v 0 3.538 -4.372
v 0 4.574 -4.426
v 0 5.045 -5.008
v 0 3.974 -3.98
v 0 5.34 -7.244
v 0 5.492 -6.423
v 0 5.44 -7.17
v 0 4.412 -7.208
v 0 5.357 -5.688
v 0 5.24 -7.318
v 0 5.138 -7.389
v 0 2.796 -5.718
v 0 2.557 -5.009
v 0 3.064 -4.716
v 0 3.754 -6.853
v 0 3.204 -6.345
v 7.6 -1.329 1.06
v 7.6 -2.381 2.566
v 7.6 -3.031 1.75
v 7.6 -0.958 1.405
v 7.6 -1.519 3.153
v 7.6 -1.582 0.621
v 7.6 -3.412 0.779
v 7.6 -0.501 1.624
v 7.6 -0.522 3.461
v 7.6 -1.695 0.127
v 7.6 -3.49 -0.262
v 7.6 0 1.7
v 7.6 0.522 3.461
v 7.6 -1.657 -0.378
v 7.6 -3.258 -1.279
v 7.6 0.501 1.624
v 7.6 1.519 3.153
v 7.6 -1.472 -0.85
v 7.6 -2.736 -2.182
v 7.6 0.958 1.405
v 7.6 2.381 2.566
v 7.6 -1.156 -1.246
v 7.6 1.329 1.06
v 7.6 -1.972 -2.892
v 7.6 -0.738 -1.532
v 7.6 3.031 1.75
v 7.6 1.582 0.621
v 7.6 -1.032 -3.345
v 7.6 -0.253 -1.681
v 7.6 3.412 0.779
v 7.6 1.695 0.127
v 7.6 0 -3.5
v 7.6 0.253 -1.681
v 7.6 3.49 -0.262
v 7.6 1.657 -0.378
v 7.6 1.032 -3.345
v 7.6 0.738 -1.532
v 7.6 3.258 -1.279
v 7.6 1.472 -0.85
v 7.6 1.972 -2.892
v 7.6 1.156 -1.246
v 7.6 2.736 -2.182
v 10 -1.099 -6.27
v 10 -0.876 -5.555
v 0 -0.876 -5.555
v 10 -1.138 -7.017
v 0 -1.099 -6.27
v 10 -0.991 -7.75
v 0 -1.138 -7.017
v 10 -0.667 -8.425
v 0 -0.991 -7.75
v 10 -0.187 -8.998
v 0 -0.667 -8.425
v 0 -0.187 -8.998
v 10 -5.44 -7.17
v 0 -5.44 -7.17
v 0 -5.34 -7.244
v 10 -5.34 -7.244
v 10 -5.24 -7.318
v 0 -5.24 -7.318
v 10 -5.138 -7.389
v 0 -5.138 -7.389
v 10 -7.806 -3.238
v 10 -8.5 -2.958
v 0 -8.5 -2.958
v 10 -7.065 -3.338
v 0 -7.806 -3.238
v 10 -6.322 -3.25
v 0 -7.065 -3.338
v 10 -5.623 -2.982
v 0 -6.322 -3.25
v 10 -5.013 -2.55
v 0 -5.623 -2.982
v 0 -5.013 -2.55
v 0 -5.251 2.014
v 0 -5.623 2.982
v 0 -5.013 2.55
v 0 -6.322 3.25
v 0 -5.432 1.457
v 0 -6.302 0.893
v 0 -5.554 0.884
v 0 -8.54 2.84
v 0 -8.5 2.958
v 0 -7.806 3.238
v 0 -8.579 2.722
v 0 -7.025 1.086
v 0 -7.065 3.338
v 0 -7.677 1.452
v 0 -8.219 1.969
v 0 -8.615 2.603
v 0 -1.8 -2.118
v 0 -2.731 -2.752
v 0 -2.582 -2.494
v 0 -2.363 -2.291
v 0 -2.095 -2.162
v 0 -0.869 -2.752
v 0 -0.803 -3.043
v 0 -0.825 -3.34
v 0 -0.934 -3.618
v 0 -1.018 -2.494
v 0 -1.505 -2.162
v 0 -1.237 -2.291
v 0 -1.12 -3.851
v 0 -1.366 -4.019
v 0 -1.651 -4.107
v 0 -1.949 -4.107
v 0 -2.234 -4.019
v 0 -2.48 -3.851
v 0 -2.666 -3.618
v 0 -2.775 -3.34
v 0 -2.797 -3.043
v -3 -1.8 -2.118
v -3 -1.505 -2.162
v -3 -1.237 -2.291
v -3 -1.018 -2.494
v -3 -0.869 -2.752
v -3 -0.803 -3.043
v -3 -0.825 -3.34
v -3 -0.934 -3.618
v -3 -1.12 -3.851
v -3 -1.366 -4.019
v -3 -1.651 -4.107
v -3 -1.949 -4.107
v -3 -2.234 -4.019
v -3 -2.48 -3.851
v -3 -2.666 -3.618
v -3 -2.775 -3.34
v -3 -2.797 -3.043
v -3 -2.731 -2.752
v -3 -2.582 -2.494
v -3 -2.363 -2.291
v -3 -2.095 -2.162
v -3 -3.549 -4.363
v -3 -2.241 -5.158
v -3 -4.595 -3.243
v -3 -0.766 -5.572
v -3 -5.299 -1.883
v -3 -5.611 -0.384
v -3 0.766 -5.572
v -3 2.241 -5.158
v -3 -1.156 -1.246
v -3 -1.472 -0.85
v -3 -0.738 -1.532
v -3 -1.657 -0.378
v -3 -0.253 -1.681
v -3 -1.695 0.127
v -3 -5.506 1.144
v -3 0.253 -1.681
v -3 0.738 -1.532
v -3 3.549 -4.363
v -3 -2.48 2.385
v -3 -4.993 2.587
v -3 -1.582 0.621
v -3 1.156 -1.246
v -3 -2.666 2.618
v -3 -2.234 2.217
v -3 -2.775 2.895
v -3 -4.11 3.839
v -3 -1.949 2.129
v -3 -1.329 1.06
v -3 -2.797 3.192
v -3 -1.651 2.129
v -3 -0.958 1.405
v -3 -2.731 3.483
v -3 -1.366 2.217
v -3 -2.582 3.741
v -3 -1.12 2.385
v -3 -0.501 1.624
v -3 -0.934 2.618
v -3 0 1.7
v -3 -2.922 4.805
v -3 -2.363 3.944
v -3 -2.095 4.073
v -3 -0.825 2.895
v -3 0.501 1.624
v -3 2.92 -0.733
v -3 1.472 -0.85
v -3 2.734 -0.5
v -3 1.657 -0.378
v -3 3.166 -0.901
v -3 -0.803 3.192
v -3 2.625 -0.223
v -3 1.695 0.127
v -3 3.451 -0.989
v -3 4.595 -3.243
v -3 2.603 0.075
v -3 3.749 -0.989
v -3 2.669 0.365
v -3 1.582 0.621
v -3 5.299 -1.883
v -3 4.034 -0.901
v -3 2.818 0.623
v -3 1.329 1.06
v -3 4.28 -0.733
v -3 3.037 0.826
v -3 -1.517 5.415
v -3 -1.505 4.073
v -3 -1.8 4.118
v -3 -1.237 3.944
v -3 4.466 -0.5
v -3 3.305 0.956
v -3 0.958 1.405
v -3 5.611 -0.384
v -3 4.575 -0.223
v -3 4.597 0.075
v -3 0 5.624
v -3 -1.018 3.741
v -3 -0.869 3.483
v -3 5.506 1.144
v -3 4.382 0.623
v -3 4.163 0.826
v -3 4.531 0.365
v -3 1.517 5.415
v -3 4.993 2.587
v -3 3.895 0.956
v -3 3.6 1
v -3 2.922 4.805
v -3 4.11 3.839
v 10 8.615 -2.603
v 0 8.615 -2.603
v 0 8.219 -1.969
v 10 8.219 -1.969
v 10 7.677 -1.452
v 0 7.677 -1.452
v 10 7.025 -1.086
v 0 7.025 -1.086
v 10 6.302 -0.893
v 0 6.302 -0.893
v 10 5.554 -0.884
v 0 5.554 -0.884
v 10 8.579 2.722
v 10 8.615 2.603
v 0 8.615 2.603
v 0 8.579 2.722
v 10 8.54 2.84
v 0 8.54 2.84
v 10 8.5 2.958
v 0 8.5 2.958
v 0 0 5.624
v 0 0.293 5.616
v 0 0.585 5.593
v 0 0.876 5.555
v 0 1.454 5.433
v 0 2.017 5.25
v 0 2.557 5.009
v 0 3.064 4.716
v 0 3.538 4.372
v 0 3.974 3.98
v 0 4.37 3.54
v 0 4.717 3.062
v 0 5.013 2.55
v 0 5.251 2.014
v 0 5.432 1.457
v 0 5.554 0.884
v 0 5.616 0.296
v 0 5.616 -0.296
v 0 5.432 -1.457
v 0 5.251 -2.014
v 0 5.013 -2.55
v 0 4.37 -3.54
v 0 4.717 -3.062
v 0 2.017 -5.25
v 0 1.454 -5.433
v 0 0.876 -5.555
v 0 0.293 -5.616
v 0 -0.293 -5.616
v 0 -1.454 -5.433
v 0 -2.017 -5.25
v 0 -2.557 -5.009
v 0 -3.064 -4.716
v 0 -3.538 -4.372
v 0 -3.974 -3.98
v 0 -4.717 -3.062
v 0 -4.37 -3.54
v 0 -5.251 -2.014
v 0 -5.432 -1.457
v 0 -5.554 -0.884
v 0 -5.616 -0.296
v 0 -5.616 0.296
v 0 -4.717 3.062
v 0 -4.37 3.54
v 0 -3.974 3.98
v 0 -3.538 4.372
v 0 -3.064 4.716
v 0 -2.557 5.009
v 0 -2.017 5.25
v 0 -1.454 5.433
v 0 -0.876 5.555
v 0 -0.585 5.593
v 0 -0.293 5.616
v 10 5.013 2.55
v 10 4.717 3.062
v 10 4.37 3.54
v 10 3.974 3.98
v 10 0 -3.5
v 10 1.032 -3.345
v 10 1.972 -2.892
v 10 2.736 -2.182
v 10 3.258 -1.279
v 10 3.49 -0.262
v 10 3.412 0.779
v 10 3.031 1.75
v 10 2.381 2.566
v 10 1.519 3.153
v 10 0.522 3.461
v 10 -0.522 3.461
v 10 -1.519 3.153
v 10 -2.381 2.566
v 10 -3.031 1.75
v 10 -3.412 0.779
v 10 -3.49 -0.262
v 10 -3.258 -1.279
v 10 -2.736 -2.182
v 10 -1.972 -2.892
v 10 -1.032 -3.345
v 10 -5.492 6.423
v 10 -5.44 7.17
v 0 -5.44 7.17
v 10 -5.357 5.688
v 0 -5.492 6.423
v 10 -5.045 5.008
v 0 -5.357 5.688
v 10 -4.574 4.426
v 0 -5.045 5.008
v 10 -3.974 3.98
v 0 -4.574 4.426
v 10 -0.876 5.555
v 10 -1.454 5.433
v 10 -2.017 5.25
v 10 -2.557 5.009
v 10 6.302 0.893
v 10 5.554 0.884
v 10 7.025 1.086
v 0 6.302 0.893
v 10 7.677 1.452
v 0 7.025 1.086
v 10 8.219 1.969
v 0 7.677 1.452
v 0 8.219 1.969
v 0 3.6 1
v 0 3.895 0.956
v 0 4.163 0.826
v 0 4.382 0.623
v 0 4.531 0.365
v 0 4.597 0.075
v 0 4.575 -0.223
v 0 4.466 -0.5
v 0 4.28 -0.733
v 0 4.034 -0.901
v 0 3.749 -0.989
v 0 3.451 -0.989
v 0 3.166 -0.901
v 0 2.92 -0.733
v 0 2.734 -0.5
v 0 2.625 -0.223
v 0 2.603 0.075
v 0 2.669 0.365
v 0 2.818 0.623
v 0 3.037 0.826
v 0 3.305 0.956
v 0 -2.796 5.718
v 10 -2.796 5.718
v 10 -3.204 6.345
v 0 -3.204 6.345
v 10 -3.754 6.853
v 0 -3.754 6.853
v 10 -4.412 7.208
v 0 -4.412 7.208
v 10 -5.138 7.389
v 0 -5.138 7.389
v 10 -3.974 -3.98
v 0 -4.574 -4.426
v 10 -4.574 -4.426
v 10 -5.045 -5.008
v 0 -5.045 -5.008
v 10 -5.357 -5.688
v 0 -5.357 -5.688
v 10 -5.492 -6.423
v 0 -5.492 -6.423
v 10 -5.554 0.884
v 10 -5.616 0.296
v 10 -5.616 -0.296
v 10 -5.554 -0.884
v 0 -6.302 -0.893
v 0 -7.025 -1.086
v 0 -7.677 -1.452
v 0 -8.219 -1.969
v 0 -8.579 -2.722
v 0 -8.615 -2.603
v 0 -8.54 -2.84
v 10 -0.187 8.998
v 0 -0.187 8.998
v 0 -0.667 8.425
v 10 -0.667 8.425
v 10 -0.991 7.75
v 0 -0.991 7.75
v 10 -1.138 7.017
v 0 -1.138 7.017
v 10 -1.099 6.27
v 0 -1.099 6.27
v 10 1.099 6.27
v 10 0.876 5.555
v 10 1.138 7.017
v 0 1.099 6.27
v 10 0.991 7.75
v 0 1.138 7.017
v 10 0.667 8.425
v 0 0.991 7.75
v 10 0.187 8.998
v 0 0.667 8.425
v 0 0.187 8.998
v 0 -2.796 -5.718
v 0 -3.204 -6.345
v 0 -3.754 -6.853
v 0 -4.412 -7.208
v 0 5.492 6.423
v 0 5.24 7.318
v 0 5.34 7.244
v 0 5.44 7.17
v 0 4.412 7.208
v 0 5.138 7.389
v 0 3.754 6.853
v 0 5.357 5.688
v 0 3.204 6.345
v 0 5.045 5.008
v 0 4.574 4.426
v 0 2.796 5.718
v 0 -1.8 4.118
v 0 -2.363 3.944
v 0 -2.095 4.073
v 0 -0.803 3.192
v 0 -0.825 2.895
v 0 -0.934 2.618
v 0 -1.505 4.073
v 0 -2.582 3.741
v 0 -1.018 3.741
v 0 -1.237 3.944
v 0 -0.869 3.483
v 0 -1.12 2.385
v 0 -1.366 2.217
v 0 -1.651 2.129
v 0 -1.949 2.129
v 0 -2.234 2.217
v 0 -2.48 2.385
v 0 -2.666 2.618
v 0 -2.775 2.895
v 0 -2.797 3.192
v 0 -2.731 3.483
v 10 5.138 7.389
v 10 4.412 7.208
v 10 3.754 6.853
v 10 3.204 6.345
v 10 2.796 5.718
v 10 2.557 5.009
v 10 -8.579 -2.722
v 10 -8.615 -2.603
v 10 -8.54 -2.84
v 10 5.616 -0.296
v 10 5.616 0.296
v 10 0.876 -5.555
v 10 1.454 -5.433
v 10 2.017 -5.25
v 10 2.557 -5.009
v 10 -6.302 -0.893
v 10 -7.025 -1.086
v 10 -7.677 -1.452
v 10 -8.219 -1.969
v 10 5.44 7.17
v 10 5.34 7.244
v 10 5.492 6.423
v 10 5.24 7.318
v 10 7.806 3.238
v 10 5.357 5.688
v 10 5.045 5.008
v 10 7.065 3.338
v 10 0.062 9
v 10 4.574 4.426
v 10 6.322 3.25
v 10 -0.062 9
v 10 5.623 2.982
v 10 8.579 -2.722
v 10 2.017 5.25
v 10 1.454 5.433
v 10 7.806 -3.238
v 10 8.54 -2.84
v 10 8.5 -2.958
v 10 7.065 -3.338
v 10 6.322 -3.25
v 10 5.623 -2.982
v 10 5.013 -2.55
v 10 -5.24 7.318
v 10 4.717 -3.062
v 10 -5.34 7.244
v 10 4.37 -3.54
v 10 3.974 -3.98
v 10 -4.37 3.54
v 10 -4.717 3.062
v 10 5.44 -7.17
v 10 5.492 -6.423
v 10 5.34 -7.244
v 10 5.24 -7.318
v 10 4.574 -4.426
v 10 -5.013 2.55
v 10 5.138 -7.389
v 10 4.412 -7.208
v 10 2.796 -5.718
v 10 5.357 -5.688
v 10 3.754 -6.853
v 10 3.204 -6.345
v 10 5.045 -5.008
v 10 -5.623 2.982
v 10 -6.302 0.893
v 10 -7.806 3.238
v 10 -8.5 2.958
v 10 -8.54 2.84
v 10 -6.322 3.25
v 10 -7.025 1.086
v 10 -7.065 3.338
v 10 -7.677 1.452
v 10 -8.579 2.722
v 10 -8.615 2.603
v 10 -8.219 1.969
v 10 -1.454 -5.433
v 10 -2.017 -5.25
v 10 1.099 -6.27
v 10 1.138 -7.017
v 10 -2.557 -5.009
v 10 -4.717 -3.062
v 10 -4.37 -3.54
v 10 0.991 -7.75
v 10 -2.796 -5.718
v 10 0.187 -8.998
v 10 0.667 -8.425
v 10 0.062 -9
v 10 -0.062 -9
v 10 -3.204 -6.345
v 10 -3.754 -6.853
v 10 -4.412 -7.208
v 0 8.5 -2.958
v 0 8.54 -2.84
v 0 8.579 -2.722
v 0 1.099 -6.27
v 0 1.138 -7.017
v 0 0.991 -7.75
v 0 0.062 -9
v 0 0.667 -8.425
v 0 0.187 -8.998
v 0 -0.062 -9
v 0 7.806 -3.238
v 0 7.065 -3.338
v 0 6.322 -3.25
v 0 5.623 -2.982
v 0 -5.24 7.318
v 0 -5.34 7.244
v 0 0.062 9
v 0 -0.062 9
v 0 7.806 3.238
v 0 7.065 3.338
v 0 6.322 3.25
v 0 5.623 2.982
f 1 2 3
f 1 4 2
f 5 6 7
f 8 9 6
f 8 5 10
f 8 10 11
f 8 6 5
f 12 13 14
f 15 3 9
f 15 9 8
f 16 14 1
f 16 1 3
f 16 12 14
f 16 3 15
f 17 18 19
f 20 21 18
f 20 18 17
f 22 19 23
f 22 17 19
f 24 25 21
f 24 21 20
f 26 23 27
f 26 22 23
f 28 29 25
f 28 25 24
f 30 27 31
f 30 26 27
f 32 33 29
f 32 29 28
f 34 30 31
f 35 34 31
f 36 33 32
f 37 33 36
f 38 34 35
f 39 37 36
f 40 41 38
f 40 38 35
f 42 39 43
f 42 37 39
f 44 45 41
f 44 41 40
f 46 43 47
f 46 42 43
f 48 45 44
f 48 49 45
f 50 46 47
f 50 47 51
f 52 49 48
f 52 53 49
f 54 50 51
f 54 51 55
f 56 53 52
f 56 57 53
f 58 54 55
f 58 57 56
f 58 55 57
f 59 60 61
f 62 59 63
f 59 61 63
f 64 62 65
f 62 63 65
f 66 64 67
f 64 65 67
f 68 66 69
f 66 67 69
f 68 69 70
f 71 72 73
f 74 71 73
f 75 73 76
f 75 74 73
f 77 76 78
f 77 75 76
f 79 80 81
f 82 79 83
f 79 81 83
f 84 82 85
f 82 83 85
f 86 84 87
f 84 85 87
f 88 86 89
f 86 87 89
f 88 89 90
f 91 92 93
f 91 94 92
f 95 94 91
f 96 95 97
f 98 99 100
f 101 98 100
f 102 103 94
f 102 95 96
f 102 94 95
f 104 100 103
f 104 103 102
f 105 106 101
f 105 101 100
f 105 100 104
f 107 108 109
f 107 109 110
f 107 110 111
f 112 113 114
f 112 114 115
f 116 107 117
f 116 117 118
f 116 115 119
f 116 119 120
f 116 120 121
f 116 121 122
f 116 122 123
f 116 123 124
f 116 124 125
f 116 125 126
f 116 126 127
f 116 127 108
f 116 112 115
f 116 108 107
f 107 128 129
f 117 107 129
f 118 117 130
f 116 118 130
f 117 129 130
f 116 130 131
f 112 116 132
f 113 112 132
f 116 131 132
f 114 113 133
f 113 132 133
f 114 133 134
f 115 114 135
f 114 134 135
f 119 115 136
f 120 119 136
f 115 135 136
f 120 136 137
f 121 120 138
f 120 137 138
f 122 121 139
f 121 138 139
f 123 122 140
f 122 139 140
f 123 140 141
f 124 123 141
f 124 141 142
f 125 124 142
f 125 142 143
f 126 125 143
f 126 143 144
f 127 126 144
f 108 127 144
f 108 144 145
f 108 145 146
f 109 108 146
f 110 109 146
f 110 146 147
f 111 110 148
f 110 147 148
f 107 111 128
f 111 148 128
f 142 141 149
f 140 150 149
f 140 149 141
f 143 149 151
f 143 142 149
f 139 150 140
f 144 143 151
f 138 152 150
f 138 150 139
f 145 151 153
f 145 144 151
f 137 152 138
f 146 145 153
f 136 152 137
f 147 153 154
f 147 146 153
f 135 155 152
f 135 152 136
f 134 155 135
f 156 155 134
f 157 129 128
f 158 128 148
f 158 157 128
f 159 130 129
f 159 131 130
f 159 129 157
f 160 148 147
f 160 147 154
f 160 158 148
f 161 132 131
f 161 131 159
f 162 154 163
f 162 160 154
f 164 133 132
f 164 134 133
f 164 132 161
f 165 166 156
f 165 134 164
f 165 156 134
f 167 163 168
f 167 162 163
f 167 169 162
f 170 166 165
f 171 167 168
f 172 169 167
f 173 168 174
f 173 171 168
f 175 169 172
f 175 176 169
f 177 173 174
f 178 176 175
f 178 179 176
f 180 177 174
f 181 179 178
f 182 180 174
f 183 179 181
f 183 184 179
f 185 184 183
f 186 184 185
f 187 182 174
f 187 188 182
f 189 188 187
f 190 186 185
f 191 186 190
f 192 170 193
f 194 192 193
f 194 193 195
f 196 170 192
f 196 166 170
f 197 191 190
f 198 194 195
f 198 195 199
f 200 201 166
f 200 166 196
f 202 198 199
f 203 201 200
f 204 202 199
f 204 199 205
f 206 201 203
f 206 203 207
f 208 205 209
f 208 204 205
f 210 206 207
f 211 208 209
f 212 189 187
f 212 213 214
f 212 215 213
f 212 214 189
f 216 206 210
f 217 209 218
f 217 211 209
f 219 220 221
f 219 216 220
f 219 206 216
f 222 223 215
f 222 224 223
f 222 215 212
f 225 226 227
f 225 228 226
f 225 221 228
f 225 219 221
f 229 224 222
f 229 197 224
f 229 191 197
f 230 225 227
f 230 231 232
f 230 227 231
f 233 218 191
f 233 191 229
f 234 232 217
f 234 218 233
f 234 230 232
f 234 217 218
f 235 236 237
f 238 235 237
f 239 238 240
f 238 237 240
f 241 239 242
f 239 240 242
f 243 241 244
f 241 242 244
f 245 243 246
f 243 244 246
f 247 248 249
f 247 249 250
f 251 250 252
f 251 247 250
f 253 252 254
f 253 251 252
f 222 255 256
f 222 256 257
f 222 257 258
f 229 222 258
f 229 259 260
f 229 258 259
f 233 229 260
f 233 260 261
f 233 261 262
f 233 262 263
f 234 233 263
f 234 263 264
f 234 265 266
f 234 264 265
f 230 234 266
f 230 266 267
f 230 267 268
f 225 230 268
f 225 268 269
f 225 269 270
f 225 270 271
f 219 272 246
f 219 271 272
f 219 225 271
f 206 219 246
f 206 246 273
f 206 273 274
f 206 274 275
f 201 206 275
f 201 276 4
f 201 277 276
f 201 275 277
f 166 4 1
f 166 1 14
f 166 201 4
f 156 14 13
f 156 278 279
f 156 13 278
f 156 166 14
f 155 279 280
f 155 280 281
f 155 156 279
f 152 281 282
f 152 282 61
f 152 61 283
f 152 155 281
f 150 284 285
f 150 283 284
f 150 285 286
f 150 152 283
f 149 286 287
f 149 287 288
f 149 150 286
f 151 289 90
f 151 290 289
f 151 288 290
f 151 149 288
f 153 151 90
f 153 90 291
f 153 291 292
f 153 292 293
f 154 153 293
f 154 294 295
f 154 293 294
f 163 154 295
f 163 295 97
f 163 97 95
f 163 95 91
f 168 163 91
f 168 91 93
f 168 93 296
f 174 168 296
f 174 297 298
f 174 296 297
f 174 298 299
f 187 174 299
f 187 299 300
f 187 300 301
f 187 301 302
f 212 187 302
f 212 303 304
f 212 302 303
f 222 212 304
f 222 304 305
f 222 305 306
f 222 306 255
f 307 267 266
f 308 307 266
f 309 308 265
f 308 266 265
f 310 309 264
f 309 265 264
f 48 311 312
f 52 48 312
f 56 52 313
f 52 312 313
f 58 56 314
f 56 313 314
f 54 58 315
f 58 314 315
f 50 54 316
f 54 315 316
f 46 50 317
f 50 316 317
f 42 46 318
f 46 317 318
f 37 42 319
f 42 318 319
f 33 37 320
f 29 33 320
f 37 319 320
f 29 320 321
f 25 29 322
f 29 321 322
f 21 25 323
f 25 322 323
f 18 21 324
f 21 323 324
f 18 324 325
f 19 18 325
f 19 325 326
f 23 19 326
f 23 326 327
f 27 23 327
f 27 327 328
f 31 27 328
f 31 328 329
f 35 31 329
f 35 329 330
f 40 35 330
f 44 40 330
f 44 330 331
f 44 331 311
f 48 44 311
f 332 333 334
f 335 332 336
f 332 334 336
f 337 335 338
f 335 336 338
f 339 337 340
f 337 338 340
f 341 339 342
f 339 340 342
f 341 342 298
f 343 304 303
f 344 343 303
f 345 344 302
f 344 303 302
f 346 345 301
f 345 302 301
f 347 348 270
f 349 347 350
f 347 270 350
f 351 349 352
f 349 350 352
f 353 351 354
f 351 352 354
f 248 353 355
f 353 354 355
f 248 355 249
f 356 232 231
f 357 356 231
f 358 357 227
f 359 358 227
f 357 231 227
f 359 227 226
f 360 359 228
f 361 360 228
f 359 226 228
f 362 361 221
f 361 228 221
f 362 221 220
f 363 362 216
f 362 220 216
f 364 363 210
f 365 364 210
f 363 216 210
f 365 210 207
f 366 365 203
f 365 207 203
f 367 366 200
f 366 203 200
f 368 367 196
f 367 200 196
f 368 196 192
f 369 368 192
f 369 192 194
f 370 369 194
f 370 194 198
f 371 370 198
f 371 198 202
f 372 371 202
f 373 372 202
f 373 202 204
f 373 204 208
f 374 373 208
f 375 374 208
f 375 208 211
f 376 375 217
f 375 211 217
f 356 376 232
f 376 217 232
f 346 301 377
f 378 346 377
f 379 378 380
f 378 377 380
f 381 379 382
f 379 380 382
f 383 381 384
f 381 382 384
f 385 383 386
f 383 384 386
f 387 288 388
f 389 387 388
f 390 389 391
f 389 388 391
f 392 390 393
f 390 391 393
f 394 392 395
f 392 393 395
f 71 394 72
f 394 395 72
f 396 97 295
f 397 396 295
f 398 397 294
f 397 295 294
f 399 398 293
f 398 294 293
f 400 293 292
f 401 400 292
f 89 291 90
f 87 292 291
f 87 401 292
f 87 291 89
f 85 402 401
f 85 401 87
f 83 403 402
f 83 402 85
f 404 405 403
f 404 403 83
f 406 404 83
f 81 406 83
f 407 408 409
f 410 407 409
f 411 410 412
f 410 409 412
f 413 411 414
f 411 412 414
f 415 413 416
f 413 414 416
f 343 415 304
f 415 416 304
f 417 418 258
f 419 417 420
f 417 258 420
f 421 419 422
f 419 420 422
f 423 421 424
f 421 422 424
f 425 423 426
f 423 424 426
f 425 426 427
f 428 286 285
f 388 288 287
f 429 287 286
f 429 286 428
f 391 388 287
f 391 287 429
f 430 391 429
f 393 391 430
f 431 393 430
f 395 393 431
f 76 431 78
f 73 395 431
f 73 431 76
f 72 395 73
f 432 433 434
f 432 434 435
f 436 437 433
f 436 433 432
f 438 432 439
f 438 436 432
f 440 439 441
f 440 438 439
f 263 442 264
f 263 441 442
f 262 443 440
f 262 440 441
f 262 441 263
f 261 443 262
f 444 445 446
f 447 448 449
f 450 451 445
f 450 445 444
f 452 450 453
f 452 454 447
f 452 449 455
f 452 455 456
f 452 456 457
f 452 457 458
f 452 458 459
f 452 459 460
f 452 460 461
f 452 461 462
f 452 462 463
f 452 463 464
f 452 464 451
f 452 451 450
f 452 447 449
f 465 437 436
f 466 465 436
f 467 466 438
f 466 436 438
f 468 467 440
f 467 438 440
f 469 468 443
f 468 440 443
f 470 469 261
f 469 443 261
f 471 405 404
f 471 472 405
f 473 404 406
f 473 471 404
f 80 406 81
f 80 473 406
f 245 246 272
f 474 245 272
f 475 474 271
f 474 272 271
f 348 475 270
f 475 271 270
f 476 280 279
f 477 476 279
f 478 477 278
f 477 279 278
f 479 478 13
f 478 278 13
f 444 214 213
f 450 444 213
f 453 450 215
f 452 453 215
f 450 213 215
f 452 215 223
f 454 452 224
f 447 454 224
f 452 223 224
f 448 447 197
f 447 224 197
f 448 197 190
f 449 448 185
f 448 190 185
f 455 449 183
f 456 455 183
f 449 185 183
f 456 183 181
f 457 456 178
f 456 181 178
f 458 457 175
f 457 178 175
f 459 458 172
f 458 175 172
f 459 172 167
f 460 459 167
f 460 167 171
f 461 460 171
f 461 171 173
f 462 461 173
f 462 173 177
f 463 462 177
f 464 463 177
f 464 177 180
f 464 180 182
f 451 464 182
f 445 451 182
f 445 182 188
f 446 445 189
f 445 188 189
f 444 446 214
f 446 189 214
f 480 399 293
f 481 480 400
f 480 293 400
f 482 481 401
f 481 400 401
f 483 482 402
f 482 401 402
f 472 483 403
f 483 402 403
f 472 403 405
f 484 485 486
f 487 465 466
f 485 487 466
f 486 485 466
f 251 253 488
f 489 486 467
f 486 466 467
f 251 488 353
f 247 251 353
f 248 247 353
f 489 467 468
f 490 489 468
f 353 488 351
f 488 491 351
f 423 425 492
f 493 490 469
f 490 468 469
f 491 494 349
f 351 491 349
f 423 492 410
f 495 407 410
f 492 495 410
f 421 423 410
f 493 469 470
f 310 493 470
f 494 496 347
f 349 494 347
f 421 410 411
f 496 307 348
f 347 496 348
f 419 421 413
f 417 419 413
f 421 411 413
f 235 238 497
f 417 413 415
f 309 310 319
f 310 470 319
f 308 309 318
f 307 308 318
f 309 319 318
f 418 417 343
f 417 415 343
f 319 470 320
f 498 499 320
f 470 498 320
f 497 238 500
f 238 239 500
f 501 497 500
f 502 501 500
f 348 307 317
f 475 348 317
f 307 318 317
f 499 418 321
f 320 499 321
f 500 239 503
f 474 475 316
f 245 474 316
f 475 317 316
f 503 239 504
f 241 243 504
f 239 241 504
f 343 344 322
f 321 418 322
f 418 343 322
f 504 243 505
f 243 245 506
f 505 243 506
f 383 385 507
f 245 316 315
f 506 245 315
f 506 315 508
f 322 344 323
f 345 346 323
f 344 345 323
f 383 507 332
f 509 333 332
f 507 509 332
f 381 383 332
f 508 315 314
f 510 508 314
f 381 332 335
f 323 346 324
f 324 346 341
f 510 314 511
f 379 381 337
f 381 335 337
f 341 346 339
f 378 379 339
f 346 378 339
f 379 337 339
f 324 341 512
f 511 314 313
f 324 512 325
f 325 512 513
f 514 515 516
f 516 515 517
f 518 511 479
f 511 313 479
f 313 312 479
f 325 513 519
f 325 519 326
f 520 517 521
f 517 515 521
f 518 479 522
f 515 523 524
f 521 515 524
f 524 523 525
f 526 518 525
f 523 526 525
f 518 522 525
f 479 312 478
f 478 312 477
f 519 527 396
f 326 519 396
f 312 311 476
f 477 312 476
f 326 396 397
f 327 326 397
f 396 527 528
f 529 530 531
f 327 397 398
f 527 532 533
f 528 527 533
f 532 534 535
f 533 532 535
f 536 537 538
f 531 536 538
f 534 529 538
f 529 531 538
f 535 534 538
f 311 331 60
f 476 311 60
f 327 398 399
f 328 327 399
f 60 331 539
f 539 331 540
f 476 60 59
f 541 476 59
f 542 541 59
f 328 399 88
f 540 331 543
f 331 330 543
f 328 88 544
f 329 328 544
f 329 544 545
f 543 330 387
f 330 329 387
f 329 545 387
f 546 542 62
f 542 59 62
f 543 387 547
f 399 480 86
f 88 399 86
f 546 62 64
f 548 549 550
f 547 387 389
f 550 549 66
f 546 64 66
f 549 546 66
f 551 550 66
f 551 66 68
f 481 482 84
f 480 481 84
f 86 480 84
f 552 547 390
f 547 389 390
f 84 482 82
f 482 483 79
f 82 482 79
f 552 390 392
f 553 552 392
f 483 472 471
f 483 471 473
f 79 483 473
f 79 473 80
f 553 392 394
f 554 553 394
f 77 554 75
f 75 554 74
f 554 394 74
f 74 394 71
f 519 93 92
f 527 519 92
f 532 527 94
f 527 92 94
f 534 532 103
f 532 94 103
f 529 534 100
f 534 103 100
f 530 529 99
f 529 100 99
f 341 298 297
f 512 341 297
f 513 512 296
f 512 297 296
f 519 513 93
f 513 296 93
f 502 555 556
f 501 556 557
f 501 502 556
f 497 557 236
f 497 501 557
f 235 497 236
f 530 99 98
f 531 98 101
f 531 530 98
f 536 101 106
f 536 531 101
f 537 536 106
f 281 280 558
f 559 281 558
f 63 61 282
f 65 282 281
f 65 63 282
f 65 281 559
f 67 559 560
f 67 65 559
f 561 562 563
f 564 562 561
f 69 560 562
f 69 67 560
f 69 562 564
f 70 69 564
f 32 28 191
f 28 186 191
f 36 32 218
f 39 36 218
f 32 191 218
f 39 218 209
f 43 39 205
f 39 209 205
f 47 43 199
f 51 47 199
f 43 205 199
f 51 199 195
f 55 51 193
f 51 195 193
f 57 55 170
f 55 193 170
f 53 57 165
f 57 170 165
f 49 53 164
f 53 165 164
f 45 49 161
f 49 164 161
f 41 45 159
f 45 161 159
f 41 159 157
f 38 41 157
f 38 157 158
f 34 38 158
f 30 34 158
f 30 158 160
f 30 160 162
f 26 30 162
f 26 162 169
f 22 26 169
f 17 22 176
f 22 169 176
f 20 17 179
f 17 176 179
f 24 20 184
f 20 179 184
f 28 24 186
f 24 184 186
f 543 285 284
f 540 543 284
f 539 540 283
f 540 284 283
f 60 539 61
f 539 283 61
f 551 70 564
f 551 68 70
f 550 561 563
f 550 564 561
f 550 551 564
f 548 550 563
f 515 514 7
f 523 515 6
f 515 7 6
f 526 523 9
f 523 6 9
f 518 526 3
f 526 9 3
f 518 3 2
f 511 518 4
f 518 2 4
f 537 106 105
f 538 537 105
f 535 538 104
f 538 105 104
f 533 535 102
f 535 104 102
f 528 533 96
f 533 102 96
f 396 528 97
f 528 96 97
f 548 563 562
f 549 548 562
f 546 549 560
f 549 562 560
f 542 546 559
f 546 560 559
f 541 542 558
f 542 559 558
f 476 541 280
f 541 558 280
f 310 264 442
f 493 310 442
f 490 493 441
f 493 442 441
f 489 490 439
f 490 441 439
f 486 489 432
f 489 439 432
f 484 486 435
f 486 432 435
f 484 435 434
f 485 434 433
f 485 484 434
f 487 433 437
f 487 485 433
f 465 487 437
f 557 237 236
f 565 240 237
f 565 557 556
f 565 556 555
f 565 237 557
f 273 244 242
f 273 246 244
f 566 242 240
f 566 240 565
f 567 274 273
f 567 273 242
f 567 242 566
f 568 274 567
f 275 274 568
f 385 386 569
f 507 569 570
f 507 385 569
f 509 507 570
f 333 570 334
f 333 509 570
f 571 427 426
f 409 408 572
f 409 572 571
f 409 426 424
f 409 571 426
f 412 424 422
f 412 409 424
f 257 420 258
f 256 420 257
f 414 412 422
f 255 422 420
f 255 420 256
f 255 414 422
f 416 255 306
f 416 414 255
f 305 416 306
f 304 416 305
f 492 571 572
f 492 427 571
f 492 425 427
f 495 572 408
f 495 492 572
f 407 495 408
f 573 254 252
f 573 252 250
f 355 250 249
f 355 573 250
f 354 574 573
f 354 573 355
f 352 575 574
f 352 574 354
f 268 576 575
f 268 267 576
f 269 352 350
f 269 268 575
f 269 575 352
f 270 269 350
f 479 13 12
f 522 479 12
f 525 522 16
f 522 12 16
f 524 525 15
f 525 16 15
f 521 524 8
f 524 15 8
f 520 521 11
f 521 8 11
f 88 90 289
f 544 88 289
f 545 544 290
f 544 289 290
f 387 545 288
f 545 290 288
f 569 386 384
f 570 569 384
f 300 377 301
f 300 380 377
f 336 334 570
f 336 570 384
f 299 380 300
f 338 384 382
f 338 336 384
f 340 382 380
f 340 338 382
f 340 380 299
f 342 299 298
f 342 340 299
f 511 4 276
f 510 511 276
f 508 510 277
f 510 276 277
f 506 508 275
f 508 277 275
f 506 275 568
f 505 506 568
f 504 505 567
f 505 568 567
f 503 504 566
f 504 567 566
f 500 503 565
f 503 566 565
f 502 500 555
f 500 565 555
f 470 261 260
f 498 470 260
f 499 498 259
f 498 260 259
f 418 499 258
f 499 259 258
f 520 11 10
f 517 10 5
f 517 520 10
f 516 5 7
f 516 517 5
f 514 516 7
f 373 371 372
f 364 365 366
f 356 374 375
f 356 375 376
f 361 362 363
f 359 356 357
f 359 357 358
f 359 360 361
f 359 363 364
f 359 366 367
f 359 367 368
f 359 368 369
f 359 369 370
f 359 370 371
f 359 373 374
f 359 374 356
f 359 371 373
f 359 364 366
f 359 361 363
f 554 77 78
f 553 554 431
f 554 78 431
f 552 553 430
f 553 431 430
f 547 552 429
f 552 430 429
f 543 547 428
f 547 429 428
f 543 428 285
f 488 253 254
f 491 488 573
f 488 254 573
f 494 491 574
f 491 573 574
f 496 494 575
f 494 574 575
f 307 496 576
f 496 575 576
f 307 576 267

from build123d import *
from build123d.topology import SkipClean

# Parameters (mm, degrees)
BASPROSKE_W                                          = 10
BASPROSKE_H                                          = 9
TOOTHCUT_DEPTH                                       = 17.186414
TEETHCUTS_COUNT                                      = 10
SALIENTE_EXTRUIR2_START                              = 3
CROQUIS2_R                                           = 5.624
SALIENTE_EXTRUIR2_DEPTH                              = 3
REFRENTADO_PARA_TORNILLO_CON_CABEZA_TRON_D           = 3.4
REFRENTADO_PARA_TORNILLO_CON_CABEZA_TRON_CBORE_D     = 7
REFRENTADO_PARA_TORNILLO_CON_CABEZA_TRON_CBORE_DEPTH = 2.4
CROQUIS5_R                                           = 1
CORTAR_EXTRUIR1_DEPTH                                = 3


with BuildPart() as part:
    # BasProSke → Base-Revolve (revolve)
    with BuildSketch(Plane(origin=(0, 0, 0), x_dir=(1, 0, 0), z_dir=(0, 1, 0)), mode=Mode.PRIVATE) as base_revolve_sk:
        with Locations((5, 4.5)):
            Rectangle(BASPROSKE_W, BASPROSKE_H)
    revolve(base_revolve_sk.sketch.rotate(Axis((-10, 0, 0), (1, 0, 0)), 180), axis=Axis((-10, 0, 0), (1, 0, 0)))

    # TooCutSke → ToothCut (cut, through all)
    with BuildSketch(Plane(origin=(0, 0, 0), x_dir=(0, 0, -1), z_dir=(1, 0, 0))):
        with BuildLine():
            ThreePointArc((0.883878, 5.55411), (0, 5.624), (-0.883878, 5.55411))
            ThreePointArc((-0.883878, 5.55411), (-1.258246, 7.379188), (-2.637817, 8.631325))
            ThreePointArc((-2.637817, 8.631325), (0, 9.0254), (2.637817, 8.631325))
            ThreePointArc((2.637817, 8.631325), (1.258246, 7.379188), (0.883878, 5.55411))
        make_face()
    toothcut = extrude(amount=TOOTHCUT_DEPTH, mode=Mode.SUBTRACT)

    # TeethCuts: ToothCut ×10 about axis
    teethcuts_axis = Axis((0, 0, 0), (1, 0, 0))
    for i in range(1, TEETHCUTS_COUNT):
        add(toothcut.rotate(teethcuts_axis, i * 360 / TEETHCUTS_COUNT), mode=Mode.SUBTRACT)

    # Croquis2 → Saliente-Extruir2 (add)
    with SkipClean():  # the faces are left unmerged after this step: merging them gives an invalid solid
        with BuildSketch(Plane.ZY.offset(SALIENTE_EXTRUIR2_START)):
            Circle(CROQUIS2_R)
        extrude(amount=-SALIENTE_EXTRUIR2_DEPTH)

    # Refrentado para tornillo con cabeza troncocónica de M31 (through all)
    with Locations(Plane(origin=(10, 0, 0), x_dir=(0, 0, -1), z_dir=(1, 0, 0))):
        with Locations((0, 0)):
            CounterBoreHole(REFRENTADO_PARA_TORNILLO_CON_CABEZA_TRON_D / 2, REFRENTADO_PARA_TORNILLO_CON_CABEZA_TRON_CBORE_D / 2, REFRENTADO_PARA_TORNILLO_CON_CABEZA_TRON_CBORE_DEPTH)

    # Croquis5 → Cortar-Extruir1 (cut)
    with SkipClean():  # the faces are left unmerged after this step: merging them gives an invalid solid
        with BuildSketch(Plane.ZY.offset(3)):
            with Locations((0, 3.6)):
                Circle(CROQUIS5_R)
            with Locations((3.117691, -1.8)):
                Circle(CROQUIS5_R)
            with Locations((-3.117691, -1.8)):
                Circle(CROQUIS5_R)
        extrude(amount=-CORTAR_EXTRUIR1_DEPTH, mode=Mode.SUBTRACT)


solid = part.part
